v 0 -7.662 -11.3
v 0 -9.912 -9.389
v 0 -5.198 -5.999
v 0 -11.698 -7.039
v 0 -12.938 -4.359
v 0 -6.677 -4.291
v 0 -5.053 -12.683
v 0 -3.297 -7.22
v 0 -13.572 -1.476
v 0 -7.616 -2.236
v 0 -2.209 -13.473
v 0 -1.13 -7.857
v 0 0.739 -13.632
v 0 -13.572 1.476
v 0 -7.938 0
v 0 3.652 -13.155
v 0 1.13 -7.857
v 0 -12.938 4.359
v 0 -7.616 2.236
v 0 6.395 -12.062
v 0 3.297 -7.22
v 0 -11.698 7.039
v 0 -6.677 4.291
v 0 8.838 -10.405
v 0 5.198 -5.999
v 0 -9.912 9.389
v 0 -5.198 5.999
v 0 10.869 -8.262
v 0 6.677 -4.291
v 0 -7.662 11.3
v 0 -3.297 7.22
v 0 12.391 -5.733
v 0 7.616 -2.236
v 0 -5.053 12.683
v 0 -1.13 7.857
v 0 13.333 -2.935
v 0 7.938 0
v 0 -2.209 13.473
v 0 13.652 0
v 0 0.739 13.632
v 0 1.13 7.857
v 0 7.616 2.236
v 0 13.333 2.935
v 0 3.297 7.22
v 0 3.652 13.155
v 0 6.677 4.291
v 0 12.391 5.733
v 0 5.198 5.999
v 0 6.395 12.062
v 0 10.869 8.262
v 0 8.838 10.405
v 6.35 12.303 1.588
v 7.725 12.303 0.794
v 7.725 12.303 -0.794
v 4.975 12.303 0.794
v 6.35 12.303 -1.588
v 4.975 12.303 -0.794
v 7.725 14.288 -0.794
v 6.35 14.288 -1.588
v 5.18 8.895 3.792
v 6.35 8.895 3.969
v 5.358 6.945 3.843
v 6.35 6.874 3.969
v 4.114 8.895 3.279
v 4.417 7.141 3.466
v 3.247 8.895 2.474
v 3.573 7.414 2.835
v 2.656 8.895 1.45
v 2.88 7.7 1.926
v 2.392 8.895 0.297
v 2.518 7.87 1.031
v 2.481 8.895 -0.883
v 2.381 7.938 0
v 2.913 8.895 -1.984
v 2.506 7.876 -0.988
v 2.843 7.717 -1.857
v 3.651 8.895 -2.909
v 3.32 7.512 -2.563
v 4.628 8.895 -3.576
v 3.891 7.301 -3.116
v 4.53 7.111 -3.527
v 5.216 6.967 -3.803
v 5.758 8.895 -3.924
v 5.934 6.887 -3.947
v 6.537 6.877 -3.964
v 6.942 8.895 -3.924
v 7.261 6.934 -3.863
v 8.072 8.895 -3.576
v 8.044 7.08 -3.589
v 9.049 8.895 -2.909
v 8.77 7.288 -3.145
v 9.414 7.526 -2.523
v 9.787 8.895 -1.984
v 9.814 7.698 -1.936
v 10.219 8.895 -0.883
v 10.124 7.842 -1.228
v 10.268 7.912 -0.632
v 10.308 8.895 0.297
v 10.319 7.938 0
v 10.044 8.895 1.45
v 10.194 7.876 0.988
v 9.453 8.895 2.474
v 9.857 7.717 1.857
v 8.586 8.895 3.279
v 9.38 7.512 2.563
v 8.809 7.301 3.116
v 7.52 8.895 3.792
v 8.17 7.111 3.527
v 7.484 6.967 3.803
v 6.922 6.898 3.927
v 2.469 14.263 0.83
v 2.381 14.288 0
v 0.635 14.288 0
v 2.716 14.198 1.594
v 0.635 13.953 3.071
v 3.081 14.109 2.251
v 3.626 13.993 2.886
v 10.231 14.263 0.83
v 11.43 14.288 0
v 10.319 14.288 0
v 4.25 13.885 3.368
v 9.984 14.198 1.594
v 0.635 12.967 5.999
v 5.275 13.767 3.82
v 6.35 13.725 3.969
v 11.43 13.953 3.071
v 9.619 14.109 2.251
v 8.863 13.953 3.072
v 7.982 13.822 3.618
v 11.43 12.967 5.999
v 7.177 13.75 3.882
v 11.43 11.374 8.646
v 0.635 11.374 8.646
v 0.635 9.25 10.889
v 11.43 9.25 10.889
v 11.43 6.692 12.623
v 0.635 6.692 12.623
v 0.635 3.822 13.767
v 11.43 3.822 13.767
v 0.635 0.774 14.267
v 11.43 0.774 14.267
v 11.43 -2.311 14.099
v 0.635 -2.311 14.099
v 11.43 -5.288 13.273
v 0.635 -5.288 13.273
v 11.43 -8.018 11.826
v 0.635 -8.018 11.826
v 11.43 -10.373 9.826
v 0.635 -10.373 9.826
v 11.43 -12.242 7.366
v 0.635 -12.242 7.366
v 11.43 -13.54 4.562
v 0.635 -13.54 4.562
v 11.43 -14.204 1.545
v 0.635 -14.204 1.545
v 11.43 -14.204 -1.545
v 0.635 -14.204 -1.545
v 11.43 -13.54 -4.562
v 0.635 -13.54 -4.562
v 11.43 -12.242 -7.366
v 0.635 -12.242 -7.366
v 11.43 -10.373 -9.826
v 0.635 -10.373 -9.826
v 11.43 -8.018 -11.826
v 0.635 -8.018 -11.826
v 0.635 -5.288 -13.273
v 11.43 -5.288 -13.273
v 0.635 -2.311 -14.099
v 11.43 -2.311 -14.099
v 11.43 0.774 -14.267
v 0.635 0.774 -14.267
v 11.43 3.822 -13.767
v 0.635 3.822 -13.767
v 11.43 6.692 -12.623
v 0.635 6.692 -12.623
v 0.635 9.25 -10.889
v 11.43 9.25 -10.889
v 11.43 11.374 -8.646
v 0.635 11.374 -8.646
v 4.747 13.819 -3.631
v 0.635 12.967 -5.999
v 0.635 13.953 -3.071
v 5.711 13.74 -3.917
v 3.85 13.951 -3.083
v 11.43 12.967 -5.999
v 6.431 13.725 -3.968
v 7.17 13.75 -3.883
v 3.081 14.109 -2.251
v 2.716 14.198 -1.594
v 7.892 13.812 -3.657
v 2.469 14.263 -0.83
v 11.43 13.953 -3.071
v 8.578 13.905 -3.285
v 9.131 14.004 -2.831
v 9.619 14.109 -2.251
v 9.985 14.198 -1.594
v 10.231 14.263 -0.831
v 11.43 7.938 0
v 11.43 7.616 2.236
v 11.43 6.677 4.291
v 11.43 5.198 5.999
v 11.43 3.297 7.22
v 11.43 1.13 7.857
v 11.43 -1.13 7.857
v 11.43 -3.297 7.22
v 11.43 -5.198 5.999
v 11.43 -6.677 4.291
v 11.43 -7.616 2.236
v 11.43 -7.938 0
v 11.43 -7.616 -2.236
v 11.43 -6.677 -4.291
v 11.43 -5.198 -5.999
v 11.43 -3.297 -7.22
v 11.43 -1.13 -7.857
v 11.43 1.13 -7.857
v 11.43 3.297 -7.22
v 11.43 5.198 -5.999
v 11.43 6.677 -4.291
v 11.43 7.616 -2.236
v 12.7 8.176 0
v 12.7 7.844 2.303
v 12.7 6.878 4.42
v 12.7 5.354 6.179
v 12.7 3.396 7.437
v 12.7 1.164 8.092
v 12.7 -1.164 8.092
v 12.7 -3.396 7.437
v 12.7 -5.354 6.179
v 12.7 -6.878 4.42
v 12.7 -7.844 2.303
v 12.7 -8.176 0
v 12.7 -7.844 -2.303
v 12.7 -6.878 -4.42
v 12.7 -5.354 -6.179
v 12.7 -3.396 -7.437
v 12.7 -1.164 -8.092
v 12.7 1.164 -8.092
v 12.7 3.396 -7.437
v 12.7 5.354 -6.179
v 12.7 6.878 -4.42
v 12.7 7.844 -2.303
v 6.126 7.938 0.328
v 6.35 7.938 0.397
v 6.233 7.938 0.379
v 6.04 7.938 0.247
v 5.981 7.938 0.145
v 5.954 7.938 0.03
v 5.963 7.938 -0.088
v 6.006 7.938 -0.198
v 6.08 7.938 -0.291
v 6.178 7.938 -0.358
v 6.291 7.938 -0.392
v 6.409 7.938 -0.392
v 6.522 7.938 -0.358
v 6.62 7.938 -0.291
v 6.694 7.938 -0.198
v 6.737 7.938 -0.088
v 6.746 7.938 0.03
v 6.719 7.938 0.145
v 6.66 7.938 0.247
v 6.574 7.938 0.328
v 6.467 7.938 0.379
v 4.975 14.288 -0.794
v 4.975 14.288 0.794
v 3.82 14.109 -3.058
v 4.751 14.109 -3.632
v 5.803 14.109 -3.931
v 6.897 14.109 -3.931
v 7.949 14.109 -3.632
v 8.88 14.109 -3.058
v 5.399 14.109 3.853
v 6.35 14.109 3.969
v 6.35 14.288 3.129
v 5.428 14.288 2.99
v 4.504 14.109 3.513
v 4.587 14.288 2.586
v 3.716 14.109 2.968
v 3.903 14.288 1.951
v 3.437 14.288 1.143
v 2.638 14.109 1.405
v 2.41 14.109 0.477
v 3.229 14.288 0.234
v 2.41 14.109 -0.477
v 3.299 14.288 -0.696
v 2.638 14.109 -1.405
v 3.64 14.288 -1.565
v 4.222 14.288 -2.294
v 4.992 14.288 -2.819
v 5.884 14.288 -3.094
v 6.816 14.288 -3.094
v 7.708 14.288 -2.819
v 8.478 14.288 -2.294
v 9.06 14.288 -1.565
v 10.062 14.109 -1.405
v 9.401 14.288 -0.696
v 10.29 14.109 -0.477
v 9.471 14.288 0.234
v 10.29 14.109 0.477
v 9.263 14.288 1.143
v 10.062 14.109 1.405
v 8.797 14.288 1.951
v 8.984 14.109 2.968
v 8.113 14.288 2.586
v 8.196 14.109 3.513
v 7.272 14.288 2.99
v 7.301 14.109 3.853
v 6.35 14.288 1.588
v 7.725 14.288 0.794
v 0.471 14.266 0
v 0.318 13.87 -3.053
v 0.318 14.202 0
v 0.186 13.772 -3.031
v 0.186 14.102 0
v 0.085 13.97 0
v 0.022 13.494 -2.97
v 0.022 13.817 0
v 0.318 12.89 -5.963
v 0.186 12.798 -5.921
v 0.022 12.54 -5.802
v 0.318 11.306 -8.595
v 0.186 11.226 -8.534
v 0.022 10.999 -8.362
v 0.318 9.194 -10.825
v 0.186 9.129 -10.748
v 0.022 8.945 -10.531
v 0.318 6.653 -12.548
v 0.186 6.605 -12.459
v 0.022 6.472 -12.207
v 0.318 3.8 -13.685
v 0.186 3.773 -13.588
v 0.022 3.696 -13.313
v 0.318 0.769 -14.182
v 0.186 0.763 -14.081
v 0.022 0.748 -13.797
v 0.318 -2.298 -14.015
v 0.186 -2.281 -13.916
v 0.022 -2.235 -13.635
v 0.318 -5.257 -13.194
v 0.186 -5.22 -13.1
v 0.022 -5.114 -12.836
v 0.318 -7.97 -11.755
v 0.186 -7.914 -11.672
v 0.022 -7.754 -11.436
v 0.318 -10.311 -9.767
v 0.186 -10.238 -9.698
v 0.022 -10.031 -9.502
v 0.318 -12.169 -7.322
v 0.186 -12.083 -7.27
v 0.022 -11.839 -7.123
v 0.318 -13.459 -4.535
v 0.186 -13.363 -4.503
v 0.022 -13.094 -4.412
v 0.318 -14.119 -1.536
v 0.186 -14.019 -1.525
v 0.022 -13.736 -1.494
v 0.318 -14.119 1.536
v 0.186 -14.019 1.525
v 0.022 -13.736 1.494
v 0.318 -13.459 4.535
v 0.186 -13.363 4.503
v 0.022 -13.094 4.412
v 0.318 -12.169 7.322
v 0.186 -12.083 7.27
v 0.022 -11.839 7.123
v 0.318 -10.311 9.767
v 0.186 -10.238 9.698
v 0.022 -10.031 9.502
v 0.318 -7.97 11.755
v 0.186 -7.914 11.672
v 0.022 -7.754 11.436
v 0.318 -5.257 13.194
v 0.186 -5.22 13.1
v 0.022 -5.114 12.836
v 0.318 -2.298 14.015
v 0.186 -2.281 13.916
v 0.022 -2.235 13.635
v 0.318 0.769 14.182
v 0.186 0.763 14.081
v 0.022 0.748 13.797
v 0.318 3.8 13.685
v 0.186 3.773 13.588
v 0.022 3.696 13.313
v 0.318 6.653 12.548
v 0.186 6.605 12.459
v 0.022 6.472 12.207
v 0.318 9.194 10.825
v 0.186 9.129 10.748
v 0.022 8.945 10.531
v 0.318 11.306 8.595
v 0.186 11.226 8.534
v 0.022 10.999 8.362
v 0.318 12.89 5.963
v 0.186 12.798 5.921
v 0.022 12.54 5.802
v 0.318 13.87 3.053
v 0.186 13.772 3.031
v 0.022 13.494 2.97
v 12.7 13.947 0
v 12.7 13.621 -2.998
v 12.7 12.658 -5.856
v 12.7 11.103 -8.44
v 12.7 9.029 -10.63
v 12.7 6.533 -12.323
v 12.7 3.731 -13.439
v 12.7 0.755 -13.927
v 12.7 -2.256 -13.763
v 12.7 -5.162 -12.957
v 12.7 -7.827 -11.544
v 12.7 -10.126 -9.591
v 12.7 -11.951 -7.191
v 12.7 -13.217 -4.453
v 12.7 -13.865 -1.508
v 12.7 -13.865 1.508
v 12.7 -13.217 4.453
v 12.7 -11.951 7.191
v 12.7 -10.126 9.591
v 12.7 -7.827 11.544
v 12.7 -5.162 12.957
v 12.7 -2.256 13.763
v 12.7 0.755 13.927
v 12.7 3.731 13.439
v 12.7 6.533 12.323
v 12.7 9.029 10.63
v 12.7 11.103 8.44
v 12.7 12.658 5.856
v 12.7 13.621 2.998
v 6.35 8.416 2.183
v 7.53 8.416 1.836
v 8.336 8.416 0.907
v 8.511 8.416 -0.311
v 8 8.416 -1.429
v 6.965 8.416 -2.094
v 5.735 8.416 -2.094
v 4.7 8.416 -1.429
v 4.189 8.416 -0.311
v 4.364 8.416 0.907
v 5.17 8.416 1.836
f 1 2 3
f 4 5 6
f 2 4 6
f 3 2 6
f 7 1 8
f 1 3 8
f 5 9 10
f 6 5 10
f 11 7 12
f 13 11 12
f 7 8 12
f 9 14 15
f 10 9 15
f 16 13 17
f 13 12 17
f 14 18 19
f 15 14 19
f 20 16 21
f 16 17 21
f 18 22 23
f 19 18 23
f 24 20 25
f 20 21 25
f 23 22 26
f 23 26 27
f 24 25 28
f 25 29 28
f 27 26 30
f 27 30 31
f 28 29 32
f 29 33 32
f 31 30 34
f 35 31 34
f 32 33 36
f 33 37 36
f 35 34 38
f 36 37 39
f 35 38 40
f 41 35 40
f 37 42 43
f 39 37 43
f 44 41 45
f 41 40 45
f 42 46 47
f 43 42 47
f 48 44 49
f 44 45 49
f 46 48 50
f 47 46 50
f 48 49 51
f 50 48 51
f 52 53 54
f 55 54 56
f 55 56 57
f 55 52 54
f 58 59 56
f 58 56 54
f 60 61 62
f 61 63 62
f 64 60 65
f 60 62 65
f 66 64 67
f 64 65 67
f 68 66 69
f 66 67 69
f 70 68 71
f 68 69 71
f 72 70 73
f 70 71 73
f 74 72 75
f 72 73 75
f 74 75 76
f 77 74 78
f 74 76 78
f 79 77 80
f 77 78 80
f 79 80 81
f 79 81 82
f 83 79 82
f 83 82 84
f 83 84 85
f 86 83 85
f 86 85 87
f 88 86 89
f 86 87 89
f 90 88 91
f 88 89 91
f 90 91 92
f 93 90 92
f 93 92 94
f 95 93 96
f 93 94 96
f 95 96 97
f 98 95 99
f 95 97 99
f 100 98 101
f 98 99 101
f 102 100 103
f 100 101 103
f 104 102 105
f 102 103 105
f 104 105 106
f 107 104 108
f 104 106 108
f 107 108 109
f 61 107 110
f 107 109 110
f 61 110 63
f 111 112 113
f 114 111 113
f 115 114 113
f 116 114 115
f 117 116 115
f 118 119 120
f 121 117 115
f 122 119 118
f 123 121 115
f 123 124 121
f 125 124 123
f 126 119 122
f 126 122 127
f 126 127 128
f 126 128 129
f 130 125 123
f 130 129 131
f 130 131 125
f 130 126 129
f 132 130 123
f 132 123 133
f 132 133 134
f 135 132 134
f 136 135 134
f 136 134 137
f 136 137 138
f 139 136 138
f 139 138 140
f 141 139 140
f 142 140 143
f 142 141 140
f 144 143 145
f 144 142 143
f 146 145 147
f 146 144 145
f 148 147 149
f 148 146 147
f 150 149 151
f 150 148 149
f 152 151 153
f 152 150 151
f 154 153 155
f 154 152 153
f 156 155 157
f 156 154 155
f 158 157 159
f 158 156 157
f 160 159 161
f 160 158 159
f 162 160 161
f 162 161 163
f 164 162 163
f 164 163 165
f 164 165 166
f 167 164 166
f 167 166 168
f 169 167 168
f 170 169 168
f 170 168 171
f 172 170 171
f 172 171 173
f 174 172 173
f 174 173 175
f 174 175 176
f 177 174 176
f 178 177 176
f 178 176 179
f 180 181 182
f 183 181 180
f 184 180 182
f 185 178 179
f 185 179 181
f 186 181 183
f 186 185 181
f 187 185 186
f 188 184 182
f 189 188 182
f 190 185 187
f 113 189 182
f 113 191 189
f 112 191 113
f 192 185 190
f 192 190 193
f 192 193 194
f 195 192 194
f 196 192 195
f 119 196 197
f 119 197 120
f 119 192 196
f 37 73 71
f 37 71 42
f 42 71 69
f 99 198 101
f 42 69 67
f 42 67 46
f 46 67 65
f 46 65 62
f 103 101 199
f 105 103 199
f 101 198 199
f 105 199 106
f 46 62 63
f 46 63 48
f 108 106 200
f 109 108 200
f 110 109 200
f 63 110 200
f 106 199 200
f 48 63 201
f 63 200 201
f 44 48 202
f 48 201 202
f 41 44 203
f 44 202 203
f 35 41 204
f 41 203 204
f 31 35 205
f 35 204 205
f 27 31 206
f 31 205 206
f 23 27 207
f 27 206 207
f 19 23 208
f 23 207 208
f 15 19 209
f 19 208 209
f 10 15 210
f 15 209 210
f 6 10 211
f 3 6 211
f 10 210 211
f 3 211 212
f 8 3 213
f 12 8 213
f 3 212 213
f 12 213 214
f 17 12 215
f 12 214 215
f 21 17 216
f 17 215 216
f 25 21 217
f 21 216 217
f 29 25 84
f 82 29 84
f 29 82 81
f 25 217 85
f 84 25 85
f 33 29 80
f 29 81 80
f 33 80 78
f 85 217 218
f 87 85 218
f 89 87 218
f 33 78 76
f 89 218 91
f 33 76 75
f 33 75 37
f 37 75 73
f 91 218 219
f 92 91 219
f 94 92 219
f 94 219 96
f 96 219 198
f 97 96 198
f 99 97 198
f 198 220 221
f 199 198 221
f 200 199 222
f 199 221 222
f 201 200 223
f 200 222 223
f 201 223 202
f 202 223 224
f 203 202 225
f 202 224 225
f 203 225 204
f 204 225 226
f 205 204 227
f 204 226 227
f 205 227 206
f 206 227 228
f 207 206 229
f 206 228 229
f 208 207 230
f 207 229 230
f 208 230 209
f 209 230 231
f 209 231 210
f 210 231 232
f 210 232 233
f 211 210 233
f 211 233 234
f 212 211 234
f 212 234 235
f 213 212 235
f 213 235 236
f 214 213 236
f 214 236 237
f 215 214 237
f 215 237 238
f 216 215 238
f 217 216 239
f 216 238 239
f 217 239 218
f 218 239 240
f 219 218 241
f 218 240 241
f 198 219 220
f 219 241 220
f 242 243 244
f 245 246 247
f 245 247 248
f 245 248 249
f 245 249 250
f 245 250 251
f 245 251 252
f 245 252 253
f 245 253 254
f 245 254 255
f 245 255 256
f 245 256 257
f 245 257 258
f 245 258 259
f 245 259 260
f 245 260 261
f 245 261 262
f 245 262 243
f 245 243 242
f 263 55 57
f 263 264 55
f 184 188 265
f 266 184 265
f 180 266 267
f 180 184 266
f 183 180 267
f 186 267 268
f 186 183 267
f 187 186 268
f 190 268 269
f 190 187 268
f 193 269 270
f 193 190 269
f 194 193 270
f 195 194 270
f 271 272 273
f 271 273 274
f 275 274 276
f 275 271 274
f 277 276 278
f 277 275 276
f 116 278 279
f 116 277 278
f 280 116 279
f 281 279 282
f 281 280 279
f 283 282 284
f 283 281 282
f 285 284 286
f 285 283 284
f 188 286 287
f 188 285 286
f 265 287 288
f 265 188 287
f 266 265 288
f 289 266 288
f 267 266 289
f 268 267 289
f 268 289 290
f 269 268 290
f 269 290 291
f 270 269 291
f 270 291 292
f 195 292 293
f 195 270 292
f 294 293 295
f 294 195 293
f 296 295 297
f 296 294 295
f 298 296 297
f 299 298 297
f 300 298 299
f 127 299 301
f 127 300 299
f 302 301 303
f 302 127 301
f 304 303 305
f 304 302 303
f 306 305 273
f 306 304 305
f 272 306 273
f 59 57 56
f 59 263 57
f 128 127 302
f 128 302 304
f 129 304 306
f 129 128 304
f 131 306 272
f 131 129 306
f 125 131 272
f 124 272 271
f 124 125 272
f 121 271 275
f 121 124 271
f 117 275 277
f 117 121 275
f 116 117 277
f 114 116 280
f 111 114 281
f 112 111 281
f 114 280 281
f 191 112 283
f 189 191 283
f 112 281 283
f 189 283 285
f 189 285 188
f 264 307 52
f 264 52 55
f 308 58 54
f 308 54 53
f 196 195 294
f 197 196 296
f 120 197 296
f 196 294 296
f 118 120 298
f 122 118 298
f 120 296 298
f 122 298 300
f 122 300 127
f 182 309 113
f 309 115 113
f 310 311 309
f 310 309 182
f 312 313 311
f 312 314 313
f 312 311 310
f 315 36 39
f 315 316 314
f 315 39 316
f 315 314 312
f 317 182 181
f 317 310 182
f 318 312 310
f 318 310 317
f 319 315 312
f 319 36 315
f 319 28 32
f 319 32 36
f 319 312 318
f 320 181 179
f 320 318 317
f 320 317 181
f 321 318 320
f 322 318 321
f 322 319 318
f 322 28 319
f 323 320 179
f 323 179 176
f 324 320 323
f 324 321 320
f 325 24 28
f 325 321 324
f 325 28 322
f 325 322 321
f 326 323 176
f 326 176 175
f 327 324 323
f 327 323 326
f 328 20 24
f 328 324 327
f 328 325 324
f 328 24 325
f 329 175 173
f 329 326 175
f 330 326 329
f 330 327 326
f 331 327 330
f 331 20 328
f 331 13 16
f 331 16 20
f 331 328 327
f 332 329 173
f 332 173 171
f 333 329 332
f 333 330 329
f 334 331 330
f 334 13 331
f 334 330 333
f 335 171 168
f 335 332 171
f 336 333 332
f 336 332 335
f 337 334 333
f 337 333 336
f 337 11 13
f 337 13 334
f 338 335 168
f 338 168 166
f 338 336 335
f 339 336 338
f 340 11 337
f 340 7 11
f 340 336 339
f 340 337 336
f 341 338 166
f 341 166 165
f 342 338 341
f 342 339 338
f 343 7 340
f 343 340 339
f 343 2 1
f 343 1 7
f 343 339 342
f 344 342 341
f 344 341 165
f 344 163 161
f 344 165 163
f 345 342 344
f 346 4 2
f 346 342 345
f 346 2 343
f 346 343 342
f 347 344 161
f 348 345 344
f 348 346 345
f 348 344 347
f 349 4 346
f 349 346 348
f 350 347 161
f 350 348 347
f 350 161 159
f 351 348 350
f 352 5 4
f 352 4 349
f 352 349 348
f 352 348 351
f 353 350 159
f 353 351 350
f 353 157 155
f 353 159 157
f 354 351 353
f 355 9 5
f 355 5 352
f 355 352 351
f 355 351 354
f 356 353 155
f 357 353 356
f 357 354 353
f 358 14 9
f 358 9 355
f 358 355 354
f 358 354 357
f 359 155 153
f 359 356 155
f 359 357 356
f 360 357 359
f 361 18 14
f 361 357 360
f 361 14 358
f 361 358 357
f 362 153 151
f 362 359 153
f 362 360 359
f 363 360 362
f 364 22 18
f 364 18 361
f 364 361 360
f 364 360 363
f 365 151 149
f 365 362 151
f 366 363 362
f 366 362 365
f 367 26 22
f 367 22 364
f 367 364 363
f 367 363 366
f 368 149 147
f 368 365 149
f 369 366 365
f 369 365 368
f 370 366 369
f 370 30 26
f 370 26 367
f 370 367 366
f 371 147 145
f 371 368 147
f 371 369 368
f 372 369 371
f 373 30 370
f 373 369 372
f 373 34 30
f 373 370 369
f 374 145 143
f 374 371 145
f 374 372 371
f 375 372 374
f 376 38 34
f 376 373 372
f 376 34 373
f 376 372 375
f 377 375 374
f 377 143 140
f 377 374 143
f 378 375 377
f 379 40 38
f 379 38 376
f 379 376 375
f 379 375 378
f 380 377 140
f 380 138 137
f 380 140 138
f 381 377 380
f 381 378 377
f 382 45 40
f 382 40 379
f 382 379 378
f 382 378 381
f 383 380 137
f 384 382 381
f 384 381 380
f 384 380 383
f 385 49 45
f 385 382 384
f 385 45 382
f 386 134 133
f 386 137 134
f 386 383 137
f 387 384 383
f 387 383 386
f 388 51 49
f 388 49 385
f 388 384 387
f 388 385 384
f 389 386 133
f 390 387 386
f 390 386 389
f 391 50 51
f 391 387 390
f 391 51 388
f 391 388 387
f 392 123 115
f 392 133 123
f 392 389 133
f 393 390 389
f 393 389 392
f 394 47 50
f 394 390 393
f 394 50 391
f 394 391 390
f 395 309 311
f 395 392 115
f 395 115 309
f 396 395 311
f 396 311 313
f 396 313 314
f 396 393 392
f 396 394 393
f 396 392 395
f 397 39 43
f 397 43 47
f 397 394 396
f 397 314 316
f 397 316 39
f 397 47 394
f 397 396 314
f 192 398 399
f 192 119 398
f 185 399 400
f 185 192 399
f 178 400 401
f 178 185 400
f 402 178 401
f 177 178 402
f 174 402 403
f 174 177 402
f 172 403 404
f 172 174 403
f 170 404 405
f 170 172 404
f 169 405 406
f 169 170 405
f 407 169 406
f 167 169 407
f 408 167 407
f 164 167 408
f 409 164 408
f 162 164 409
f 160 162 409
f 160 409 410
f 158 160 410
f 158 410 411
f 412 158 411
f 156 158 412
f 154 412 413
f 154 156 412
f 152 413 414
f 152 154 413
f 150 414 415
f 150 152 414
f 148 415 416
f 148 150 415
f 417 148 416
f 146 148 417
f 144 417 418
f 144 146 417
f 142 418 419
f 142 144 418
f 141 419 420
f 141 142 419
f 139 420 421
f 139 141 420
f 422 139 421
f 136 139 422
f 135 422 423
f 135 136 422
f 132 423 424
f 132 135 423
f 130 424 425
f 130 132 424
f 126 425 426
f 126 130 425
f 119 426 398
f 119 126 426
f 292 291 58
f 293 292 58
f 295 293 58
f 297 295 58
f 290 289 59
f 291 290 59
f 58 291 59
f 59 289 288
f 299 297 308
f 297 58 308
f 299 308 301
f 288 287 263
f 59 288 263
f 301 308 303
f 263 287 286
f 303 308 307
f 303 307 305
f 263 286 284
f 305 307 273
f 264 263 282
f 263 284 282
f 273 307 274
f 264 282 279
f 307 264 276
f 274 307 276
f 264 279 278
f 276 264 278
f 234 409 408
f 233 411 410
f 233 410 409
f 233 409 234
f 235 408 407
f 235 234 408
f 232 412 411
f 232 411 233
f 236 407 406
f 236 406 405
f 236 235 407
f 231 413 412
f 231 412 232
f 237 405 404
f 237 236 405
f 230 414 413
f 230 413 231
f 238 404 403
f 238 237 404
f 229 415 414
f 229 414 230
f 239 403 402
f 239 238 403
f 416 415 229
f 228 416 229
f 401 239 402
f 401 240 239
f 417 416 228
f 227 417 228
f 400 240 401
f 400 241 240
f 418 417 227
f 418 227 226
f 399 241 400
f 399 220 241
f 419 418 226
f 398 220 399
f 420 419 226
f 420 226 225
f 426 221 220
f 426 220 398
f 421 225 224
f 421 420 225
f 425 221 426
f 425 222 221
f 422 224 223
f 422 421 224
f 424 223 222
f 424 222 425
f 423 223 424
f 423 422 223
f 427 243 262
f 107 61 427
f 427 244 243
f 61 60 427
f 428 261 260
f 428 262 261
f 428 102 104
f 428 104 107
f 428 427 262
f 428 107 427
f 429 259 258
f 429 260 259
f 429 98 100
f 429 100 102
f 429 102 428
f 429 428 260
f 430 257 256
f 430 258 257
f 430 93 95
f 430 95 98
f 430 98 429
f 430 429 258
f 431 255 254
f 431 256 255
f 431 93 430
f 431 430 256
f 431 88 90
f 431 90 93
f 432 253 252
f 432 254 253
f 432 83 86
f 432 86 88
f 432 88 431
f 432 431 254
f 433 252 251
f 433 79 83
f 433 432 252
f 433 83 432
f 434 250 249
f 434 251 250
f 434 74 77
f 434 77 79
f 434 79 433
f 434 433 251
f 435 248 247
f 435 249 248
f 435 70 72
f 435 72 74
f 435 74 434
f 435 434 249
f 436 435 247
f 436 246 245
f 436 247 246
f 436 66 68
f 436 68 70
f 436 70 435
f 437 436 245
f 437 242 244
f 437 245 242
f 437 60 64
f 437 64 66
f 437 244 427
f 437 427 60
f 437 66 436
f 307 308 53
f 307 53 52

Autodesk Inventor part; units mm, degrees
ref_plane "YZ Plane" through (0, 0, 0) normal (1, 0, 0) x (0, 1, 0)
sketch "Boceto1" plane through (0, 0, 0) normal (0, 0, 1) x (1, 0, 0)
  line L0 (0, 14.2875) -> (12.7, 14.2875)
  line L1 (-1.9497, 0) -> (21.5466, 0)
  line L2 (0, 14.2875) -> (0, 7.9375)
  line L3 (0, 7.9375) -> (12.7, 7.9375)
  line L4 (12.7, 7.9375) -> (12.7, 14.2875)
  line L5 (-6.6489, 0) -> (26.2458, 0) projected
  line L6 (0, 54) -> (0, -9) projected
  dimension "d0" = 28.575
  dimension "d1" = 15.875
  dimension "d2" = 12.7
revolve "Cuerpo" add sketch "Boceto1" angle 360 about axis through (-1.9497, 0, 0) along (1, 0, 0)
ref_plane "IDS_WORKPLANE{1}" through (0, 14.2875, 0) normal (0, 1, 0) x (-1, 0, 0)
sketch "Boceto2" plane through (0, 14.2875, 0) normal (0, 1, 0) x (-1, 0, 0)
  line L0 (0, 14.2875) -> (0, -14.2875) projected
  line L1 (-12.156, 0) -> (2.026, 0) projected
  point P0 (-6.35, 0)
  dimension "d7" = 6.35
hole "Agujero1" at (6.35, 14.2875, 0) direction (0, -1, 0) diameter 7.9375 depth 14.2875 tip angle 118
ref_plane "IDS_WORKPLANE{2}" through (6.35, 0, 0) normal (-1, 0, 0) x (0, 0, 1)
sketch "Boceto3" plane through (6.35, 0, 0) normal (-1, 0, 0) x (0, 0, 1)
  line L0 (0, 14.2875) -> (3.1293, 14.2875)
  line L1 (3.1293, 14.2875) -> (3.9688, 14.1091)
  line L2 (3.9688, 14.1091) -> (3.9688, 8.8946)
  line L3 (0, 56.8575) -> (0, -26.145) projected
  circle A0 centre (0, 0) radius 14.2875 projected
  line L4 (0, 14.2875) -> (0, 7.9375)
  line L5 (3.9688, 8.8946) -> (0.3969, 7.9375)
  line L6 (0.3969, 7.9375) -> (0, 7.9375)
  dimension "d18" = 6.2586
  dimension "d19" = 7.9375
  dimension "d20" = 0.7937
  dimension "d21" = 6.35
  dimension "d30" = 15
  dimension "d31" = 12
revolve "Tornillo de cabeza perdida1" add sketch "Boceto3" angle 360 about axis through (6.35, 14.2875, 0) along (0, -1, 0) picked at (1.9014, 10.3523) contours A0 L2 L5 L6 L3 | L0 L1 L2 A0
sketch "Boceto4" plane through (0, 14.2875, 0) normal (0, 1, 0) x (-1, 0, 0)
  line L0 (-6.35, 1.5875) -> (-4.9752, 0.7937)
  line L1 (-4.9752, 0.7937) -> (-4.9752, -0.7938)
  line L2 (-4.9752, -0.7938) -> (-6.35, -1.5875)
  line L3 (-6.35, -1.5875) -> (-7.7248, -0.7937)
  line L4 (-7.7248, -0.7937) -> (-7.7248, 0.7938)
  line L5 (-7.7248, 0.7938) -> (-6.35, 1.5875)
  line L6 (-14.2345, 0) -> (2.3724, 0) projected
  line L7 (0, 7.9375) -> (0, -7.9375) projected
  point P0 (-6.35, 0)
  dimension "d22" = 3.175
  dimension "d23" = 6.35
extrude "Ranura1" cut sketch "Boceto4" against normal blind 1.9844
chamfer "Chaflán1" distance 1.27 angle 15 1 edges at (12.7, -14.2875, 0) measured on face at (4.2333, 9.0361, 11.0672)
chamfer "Chaflán2" distance 0.2381 distance2 1.27 1 edges at (12.7, -7.9375, 0) measured on face at (12.7, 11.8089, -1.1126)
fillet "Empalme1" radius 0.635 1 edges at (0, -14.2875, 0)
equation "\"d7\" = 0.5 * SD"
equation "\"d18\" = GD1"
equation "\"d19\" = NND"
equation "\"d20\" = 0.1 * NND"
equation "\"d21\" = -0.5 * WND + 0.5 * SD2"
equation "\"d30\" = FAWI"
equation "\"d31\" = 0.8 * FAWI"
equation "\"d22\" = 0.4 * NND"
equation "\"d23\" = 0.5 * SD"
equation "\"d24\" = 0.25 * NND"
equation "\"d8\" = NND"
equation "\"d13\" = 0.5 * SD2"
equation "\"d4\" = PHH"
equation "\"d5\" = FAWI"
equation "\"d59\" = PHH"
equation "\"d26\" = -0.5 * WND + 0.5 * NND1"
equation "\"d27\" = PHH"
equation "\"d29\" = RR"
equation "\"d0\" = SD2"
equation "\"d1\" = WND"
equation "\"d2\" = SD"
equation "\"WND\" = 15.875"
equation "\"SD2\" = 28.575"
equation "\"SD\" = 12.7"
equation "\"NND\" = 7.9375"
equation "\"FAWI\" = 15deg"
equation "\"PHH\" = 1.27"
equation "\"d6\" = 0.5 * SD2"
equation "\"GD1\" = 6.25856"
equation "\"d17\" = -0.5 * SD"
equation "\"RR\" = 0.635"
equation "\"NND1\" = 16.35125"
properties part number "Unbrako. Hallowell Steel Collars. Inch Series - 0.625 x 1 1/8 x 1/2" material "Acero, suave"
